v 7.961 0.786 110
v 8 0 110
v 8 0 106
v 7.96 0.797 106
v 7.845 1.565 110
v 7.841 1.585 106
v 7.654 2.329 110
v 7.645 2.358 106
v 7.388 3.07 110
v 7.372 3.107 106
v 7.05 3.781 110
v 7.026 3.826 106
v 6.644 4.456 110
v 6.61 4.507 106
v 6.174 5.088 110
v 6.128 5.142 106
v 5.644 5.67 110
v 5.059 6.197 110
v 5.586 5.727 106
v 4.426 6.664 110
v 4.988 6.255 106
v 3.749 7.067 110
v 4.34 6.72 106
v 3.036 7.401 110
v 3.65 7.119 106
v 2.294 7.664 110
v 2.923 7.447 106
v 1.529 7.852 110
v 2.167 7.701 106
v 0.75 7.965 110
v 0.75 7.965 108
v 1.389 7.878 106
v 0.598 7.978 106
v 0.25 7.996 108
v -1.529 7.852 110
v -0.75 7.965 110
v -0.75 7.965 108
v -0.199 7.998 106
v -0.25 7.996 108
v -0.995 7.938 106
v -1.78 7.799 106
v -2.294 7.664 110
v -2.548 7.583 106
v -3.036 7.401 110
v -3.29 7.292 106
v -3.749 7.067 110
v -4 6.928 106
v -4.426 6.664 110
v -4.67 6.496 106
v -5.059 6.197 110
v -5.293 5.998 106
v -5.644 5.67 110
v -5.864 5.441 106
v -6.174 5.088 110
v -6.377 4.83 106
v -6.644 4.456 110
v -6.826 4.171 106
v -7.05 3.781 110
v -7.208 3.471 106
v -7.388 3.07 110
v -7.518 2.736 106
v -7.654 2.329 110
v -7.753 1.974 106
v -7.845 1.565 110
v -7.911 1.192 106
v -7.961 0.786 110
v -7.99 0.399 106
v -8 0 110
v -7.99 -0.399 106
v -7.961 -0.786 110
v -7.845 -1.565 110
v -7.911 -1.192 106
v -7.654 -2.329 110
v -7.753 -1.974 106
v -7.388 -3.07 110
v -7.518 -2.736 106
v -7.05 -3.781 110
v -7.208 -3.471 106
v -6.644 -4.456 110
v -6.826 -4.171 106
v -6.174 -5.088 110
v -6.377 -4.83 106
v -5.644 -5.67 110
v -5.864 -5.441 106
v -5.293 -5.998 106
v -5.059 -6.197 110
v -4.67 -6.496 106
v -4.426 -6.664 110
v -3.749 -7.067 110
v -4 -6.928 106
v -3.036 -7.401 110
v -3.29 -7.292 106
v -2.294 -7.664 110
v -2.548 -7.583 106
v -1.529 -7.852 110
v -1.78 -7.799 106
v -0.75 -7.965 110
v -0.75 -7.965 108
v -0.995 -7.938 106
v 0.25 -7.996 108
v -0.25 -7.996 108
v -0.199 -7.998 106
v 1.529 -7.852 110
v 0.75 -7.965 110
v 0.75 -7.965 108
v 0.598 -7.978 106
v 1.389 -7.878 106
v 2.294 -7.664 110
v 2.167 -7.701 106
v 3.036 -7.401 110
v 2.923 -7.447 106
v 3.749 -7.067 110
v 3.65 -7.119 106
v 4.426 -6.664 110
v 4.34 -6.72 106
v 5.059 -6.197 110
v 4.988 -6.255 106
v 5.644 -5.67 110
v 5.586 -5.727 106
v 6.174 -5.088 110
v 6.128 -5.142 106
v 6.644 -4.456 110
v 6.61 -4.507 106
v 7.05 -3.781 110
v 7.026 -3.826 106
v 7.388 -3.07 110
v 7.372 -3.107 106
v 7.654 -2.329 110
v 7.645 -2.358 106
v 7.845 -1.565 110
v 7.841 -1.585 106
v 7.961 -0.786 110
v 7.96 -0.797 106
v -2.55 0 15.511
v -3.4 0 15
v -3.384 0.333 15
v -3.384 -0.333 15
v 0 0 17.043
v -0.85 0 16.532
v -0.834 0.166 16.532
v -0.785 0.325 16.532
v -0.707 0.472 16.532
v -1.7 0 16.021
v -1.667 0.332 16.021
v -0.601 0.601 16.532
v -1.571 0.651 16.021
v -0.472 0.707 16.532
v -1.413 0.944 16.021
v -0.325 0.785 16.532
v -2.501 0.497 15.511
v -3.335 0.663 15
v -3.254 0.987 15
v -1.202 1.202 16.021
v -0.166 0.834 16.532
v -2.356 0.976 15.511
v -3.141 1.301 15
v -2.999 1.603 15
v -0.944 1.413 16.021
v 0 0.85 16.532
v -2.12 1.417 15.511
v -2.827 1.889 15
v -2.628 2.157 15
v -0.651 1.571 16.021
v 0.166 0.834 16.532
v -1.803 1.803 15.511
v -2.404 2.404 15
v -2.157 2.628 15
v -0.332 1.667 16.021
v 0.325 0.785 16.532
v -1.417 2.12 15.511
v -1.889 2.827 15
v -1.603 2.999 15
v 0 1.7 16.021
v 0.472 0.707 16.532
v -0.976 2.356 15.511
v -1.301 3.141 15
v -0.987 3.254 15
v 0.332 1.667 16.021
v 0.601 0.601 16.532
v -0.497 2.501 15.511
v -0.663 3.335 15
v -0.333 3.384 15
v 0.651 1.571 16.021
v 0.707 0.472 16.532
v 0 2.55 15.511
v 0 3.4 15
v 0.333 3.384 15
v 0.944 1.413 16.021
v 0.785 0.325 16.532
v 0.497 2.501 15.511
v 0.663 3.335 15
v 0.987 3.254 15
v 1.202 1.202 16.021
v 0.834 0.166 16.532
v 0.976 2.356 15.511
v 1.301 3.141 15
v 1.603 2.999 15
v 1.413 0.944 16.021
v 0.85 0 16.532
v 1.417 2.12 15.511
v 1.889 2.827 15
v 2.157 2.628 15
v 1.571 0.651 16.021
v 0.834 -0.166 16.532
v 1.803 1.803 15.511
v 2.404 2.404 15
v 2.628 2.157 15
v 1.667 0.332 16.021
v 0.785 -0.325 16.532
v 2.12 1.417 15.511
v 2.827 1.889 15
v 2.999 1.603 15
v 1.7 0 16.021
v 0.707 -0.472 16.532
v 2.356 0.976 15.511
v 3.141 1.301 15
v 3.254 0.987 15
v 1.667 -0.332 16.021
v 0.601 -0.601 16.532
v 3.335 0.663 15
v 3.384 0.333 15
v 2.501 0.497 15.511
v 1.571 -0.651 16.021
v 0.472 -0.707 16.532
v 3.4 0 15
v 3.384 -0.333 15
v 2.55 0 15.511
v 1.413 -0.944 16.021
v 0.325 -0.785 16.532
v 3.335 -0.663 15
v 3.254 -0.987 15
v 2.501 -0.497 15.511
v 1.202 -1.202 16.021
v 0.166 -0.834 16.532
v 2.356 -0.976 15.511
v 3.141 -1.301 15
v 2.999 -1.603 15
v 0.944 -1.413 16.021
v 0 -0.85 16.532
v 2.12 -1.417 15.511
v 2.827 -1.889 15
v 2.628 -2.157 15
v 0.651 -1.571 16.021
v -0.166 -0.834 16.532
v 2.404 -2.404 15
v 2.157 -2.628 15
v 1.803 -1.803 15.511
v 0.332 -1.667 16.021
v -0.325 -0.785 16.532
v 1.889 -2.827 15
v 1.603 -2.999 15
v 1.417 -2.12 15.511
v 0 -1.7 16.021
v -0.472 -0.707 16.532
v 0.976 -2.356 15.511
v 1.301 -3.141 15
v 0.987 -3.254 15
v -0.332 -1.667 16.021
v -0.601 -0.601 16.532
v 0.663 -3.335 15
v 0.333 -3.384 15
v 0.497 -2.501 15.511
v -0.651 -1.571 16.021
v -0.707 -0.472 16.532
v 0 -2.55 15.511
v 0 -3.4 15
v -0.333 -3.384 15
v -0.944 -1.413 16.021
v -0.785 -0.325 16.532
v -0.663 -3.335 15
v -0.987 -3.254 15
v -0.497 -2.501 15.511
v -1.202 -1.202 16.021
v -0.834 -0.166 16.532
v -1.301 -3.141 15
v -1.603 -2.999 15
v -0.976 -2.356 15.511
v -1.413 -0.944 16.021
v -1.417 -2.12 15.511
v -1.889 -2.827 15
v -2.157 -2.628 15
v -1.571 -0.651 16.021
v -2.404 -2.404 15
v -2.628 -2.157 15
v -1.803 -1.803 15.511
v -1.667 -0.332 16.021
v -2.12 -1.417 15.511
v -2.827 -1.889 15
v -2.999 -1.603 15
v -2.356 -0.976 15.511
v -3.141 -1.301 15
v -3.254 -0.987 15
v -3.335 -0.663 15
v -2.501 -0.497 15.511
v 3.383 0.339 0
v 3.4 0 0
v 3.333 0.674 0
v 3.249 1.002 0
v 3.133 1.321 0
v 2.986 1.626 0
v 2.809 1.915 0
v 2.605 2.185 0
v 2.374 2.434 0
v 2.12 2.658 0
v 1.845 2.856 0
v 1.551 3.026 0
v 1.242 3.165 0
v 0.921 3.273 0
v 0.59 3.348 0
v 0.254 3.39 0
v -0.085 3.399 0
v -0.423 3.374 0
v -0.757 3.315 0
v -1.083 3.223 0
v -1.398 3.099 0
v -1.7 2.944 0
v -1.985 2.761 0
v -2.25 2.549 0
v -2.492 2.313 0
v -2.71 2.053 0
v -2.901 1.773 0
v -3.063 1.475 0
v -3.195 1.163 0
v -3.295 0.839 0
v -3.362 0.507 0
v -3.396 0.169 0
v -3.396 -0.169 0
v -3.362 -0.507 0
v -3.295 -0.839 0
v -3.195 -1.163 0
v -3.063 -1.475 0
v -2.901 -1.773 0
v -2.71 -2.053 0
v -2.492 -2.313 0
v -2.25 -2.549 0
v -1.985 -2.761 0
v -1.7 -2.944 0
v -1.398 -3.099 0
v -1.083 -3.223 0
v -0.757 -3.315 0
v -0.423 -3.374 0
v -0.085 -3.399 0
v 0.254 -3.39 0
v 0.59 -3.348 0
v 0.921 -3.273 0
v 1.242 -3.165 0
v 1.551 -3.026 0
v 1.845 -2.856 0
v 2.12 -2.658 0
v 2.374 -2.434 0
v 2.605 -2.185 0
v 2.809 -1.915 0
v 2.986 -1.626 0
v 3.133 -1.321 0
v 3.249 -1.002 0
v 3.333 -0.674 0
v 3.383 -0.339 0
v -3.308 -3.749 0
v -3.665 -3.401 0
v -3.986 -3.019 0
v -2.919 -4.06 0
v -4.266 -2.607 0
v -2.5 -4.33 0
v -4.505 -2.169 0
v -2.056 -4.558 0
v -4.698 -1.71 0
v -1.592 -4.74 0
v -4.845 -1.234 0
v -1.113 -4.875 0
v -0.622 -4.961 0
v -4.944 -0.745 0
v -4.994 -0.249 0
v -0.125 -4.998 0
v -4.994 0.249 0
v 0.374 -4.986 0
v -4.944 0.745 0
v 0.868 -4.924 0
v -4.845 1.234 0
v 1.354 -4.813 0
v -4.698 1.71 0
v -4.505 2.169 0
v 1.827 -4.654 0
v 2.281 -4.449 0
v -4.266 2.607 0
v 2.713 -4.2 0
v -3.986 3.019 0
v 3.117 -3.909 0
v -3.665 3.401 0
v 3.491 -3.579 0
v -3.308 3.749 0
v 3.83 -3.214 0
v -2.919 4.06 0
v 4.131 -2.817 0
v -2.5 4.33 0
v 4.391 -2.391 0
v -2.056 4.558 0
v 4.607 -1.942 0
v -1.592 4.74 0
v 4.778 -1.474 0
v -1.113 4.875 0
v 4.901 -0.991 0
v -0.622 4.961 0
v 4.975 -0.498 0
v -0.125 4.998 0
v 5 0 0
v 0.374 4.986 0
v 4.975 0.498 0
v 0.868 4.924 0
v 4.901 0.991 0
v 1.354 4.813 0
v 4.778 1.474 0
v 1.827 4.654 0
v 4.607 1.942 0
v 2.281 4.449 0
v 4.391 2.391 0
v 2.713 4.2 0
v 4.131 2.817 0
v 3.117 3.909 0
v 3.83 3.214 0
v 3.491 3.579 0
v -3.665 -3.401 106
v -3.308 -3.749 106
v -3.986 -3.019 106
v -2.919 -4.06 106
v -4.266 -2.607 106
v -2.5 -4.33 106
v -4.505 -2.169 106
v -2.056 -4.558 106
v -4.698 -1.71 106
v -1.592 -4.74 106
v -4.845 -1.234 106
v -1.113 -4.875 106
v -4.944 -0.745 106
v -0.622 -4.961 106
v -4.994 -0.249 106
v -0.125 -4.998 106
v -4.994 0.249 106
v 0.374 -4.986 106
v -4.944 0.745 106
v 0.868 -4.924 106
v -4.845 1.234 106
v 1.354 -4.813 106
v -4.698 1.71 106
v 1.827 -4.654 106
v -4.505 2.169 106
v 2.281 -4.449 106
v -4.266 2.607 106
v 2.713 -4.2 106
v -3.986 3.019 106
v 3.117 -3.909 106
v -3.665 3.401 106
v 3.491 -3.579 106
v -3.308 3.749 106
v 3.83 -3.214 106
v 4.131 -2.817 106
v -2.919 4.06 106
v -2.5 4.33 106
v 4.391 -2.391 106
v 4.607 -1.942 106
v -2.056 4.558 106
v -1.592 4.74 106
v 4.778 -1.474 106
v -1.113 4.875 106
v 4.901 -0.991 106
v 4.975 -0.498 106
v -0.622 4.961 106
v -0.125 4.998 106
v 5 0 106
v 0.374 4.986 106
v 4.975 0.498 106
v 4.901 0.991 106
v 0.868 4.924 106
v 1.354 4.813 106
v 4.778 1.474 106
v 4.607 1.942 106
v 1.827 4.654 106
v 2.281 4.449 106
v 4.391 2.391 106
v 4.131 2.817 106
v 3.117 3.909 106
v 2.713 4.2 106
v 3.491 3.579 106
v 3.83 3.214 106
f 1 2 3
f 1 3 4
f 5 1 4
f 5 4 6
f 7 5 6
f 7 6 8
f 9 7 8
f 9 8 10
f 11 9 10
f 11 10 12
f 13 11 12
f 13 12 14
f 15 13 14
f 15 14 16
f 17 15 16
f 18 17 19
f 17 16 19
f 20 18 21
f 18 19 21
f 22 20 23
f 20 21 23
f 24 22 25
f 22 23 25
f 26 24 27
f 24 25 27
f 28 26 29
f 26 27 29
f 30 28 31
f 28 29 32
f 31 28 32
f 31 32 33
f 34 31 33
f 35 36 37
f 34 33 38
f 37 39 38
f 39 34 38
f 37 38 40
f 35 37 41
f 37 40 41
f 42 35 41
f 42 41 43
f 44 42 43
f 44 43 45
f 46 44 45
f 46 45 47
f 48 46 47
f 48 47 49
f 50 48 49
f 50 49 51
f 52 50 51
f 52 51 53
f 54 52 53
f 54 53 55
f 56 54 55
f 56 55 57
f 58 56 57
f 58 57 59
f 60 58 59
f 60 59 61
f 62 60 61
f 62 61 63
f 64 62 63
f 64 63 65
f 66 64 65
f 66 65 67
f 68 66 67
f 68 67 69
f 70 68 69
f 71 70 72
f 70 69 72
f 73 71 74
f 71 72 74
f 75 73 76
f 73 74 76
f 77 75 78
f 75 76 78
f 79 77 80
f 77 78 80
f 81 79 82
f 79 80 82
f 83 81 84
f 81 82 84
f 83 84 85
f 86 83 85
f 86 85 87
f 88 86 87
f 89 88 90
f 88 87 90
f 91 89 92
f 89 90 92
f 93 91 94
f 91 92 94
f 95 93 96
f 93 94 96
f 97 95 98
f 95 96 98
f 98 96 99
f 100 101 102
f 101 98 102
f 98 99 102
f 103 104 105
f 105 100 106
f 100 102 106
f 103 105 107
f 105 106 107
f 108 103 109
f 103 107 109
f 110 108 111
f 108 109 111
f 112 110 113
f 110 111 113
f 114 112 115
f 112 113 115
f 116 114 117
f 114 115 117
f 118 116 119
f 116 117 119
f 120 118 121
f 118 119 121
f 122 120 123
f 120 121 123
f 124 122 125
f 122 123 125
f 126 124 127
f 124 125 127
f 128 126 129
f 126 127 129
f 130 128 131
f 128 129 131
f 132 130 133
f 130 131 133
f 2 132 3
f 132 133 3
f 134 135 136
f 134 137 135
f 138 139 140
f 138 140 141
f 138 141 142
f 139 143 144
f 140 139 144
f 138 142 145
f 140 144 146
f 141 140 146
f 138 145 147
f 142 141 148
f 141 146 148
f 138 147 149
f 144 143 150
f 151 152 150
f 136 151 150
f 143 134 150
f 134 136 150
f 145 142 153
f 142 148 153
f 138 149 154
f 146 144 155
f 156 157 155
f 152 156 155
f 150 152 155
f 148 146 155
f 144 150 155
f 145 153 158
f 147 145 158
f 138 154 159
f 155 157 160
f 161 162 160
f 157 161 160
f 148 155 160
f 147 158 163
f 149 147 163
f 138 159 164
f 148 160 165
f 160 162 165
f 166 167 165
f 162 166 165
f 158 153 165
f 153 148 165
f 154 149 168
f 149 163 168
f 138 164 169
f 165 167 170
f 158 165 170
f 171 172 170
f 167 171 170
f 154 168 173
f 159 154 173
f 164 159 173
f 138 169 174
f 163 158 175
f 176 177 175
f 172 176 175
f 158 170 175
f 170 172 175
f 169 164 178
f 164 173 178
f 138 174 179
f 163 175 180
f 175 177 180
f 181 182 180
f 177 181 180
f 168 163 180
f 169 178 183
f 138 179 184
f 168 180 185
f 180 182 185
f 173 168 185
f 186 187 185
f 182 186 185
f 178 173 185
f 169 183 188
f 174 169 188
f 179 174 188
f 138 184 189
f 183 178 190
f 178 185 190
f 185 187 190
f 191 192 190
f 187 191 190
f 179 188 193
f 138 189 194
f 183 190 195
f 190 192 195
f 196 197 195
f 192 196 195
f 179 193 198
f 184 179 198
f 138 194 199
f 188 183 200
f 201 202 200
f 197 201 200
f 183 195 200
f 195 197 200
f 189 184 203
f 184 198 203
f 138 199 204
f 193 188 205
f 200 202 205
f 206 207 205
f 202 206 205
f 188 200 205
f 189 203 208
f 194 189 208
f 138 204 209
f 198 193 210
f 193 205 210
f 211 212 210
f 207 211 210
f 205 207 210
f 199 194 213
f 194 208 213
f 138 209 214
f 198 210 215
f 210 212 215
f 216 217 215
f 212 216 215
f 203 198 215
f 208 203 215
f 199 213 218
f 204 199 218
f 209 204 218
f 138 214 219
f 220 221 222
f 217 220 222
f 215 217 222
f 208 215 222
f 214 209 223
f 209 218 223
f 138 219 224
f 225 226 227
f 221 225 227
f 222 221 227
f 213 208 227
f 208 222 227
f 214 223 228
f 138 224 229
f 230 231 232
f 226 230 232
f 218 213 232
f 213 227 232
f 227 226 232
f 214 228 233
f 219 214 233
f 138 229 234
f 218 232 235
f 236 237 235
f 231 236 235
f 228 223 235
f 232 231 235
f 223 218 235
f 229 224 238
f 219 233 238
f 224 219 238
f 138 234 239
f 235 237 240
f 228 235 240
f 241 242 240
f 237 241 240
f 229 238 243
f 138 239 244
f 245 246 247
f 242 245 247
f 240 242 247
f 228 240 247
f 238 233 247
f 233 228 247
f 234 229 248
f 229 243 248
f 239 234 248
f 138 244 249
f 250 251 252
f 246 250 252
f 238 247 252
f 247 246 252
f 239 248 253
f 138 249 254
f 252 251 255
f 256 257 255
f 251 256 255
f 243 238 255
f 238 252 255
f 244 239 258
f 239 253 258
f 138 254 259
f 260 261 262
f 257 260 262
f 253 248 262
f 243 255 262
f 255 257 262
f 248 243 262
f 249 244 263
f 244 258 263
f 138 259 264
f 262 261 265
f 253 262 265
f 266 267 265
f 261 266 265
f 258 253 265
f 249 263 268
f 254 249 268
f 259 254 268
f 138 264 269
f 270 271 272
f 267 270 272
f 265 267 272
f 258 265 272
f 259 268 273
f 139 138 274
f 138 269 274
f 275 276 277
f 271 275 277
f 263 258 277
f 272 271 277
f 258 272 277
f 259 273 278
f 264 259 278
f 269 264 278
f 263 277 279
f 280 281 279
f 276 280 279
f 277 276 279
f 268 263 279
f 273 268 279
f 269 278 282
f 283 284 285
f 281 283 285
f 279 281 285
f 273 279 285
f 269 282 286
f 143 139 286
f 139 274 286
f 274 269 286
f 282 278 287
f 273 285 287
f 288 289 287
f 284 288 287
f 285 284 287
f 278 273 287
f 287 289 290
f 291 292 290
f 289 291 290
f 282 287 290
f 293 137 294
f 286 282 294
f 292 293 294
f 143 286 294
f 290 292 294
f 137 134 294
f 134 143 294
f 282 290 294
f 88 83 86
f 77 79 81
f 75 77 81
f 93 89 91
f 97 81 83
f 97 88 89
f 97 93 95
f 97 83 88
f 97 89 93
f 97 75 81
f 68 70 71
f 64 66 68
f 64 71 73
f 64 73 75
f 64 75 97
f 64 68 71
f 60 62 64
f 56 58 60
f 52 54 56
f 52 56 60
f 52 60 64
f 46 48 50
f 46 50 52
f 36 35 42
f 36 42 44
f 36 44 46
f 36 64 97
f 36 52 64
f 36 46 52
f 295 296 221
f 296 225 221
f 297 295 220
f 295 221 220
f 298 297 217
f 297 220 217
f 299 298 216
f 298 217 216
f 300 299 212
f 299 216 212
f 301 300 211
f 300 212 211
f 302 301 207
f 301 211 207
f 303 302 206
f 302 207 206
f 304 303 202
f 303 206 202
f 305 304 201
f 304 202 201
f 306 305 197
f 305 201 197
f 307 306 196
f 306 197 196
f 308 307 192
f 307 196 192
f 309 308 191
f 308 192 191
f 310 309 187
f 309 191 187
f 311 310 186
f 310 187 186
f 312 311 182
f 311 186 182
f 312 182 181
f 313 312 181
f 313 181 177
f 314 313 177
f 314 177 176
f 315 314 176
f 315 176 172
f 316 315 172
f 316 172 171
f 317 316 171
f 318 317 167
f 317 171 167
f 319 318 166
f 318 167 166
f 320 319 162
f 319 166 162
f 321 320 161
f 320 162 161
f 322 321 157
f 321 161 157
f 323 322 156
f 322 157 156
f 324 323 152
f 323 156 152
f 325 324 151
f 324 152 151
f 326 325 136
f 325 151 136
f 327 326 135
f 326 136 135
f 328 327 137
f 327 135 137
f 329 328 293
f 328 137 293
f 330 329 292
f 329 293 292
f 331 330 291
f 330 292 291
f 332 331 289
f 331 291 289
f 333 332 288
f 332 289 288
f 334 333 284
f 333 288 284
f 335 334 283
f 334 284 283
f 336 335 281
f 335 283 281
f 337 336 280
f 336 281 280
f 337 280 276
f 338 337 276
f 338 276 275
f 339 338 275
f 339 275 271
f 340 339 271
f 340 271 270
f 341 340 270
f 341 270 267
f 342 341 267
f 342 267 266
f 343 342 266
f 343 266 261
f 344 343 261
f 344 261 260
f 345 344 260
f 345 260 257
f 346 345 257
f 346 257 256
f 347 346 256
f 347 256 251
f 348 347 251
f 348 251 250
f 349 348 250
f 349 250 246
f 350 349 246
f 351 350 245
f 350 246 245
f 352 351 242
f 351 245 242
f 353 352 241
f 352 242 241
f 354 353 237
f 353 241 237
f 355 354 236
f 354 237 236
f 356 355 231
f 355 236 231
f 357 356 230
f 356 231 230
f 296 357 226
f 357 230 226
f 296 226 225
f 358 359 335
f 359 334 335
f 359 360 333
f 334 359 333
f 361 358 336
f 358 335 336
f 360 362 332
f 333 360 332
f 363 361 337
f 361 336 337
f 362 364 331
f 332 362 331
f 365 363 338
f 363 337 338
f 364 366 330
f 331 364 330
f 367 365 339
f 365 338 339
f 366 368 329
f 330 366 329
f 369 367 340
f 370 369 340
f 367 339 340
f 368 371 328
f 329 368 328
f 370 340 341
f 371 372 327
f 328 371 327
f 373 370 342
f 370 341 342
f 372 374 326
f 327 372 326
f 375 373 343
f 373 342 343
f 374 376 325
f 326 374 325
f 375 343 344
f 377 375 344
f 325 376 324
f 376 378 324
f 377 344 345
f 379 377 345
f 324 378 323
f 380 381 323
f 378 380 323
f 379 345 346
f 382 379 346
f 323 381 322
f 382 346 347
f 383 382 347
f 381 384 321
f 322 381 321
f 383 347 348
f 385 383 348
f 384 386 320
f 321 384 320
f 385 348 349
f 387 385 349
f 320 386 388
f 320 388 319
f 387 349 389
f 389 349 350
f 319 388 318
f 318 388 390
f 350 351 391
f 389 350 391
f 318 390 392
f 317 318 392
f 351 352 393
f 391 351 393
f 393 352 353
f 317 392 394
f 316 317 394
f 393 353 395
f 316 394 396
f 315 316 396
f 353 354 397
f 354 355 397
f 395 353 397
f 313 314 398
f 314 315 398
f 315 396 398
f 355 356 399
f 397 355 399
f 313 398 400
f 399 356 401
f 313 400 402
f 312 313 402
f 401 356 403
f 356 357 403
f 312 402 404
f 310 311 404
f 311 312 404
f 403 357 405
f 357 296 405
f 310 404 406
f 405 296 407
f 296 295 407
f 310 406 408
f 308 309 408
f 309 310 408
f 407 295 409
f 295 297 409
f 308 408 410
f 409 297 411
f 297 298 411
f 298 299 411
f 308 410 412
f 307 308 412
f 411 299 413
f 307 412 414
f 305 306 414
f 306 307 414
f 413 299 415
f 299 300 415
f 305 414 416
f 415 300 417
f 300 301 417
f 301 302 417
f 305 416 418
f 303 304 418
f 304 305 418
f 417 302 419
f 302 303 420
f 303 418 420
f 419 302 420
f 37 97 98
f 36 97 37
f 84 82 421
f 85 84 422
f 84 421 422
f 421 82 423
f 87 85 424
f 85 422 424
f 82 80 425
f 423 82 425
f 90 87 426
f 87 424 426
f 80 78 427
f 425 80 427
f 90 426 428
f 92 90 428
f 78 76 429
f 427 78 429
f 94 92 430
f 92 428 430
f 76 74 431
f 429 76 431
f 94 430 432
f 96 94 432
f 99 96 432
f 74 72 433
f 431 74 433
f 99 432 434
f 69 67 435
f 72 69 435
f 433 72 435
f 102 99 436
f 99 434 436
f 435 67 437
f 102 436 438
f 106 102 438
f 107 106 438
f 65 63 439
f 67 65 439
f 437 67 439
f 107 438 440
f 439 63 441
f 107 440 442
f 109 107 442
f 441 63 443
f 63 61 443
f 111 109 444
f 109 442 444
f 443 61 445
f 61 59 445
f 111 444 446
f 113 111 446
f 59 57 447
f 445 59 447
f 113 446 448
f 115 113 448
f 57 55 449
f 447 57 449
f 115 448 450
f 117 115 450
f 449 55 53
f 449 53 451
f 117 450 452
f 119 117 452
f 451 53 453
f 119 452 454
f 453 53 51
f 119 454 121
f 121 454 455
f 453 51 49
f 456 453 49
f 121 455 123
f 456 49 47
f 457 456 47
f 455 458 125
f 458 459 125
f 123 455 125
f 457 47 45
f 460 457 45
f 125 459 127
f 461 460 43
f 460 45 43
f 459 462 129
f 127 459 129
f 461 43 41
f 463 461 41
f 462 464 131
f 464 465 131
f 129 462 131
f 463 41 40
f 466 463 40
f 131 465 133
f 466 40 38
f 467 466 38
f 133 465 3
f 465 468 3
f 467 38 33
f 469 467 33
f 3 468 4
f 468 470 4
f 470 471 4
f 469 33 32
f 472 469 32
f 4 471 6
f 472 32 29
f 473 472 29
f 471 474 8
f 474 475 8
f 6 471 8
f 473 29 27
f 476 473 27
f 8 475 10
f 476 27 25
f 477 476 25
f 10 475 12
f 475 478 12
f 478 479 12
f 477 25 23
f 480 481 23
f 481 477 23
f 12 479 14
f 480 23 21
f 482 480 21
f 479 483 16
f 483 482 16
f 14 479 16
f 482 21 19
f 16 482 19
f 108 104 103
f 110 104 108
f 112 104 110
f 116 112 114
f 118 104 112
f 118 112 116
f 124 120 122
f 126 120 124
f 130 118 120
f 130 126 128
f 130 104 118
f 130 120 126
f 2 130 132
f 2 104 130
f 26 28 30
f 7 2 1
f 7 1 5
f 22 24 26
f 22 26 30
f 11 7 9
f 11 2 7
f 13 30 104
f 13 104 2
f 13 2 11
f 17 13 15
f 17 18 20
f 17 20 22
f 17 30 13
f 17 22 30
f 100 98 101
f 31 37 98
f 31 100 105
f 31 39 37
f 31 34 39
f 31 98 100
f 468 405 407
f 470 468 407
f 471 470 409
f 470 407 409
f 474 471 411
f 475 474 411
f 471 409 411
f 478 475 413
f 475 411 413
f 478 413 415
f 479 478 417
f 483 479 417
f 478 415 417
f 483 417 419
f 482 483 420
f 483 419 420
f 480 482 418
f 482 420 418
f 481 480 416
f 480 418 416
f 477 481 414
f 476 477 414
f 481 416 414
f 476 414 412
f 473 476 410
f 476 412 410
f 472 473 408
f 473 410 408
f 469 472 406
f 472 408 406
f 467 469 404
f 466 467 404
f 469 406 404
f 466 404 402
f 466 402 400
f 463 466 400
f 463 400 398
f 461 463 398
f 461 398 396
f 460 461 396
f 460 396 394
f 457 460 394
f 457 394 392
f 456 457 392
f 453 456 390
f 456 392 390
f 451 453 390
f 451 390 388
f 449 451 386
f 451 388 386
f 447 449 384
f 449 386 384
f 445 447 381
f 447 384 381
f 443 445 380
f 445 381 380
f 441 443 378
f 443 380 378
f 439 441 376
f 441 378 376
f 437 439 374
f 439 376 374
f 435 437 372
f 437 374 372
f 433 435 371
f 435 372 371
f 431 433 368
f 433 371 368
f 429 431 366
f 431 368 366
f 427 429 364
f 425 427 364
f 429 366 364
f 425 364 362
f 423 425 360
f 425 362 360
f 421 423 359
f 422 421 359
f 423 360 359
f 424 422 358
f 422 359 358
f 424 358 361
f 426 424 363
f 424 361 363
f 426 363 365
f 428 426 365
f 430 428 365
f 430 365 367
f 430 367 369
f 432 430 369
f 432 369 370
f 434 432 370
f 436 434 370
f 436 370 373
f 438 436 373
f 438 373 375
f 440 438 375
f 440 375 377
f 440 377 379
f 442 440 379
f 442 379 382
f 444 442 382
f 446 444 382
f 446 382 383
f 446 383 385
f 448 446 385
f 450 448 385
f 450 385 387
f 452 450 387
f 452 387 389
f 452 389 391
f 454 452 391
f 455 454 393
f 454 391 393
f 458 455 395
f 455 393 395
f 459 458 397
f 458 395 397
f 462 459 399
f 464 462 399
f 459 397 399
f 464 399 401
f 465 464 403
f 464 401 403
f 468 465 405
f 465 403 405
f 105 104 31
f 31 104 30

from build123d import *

# Parameters (mm, degrees)
SKETCH_1_R             = 5
EXTRUDE_1_DEPTH        = 106
SKETCH_2_R             = 8
EXTRUDE_2_DEPTH        = 4
SKETCH_4_W             = 1.5
SKETCH_4_H             = 19.56005024
CUT_EXTRUDE_1_DEPTH    = 2
HOLE_WIZARD_M8_1_D     = 6.8
HOLE_WIZARD_M8_1_DEPTH = 15
HOLE_WIZARD_M8_1_TIP   = 2.042926105


with BuildPart() as part:
    # 草图1 → 凸台-拉伸1 (new body)
    with BuildSketch(Plane.XY):
        Circle(SKETCH_1_R)
    extrude(amount=EXTRUDE_1_DEPTH)

    # 草图2 → 凸台-拉伸2 (add)
    with BuildSketch(Plane.XY.offset(106)):
        Circle(SKETCH_2_R)
    extrude(amount=EXTRUDE_2_DEPTH)

    # 草图4 → 切除-拉伸1 (cut)
    with BuildSketch(Plane.XY.offset(110)):
        Rectangle(SKETCH_4_W, SKETCH_4_H)
    extrude(amount=-CUT_EXTRUDE_1_DEPTH, mode=Mode.SUBTRACT)

    # M8 螺纹孔的螺纹孔钻头1
    with Locations(Plane(origin=(0, 0, 0), x_dir=(-1, 0, 0), z_dir=(0, 0, -1))):
        with Locations((0, 0)):
            Hole(HOLE_WIZARD_M8_1_D / 2, depth=HOLE_WIZARD_M8_1_DEPTH)
            with Locations((0, 0, -(HOLE_WIZARD_M8_1_DEPTH + HOLE_WIZARD_M8_1_TIP / 2))):  # 118° drill point
                Cone(0, HOLE_WIZARD_M8_1_D / 2, HOLE_WIZARD_M8_1_TIP, mode=Mode.SUBTRACT)


solid = part.part
